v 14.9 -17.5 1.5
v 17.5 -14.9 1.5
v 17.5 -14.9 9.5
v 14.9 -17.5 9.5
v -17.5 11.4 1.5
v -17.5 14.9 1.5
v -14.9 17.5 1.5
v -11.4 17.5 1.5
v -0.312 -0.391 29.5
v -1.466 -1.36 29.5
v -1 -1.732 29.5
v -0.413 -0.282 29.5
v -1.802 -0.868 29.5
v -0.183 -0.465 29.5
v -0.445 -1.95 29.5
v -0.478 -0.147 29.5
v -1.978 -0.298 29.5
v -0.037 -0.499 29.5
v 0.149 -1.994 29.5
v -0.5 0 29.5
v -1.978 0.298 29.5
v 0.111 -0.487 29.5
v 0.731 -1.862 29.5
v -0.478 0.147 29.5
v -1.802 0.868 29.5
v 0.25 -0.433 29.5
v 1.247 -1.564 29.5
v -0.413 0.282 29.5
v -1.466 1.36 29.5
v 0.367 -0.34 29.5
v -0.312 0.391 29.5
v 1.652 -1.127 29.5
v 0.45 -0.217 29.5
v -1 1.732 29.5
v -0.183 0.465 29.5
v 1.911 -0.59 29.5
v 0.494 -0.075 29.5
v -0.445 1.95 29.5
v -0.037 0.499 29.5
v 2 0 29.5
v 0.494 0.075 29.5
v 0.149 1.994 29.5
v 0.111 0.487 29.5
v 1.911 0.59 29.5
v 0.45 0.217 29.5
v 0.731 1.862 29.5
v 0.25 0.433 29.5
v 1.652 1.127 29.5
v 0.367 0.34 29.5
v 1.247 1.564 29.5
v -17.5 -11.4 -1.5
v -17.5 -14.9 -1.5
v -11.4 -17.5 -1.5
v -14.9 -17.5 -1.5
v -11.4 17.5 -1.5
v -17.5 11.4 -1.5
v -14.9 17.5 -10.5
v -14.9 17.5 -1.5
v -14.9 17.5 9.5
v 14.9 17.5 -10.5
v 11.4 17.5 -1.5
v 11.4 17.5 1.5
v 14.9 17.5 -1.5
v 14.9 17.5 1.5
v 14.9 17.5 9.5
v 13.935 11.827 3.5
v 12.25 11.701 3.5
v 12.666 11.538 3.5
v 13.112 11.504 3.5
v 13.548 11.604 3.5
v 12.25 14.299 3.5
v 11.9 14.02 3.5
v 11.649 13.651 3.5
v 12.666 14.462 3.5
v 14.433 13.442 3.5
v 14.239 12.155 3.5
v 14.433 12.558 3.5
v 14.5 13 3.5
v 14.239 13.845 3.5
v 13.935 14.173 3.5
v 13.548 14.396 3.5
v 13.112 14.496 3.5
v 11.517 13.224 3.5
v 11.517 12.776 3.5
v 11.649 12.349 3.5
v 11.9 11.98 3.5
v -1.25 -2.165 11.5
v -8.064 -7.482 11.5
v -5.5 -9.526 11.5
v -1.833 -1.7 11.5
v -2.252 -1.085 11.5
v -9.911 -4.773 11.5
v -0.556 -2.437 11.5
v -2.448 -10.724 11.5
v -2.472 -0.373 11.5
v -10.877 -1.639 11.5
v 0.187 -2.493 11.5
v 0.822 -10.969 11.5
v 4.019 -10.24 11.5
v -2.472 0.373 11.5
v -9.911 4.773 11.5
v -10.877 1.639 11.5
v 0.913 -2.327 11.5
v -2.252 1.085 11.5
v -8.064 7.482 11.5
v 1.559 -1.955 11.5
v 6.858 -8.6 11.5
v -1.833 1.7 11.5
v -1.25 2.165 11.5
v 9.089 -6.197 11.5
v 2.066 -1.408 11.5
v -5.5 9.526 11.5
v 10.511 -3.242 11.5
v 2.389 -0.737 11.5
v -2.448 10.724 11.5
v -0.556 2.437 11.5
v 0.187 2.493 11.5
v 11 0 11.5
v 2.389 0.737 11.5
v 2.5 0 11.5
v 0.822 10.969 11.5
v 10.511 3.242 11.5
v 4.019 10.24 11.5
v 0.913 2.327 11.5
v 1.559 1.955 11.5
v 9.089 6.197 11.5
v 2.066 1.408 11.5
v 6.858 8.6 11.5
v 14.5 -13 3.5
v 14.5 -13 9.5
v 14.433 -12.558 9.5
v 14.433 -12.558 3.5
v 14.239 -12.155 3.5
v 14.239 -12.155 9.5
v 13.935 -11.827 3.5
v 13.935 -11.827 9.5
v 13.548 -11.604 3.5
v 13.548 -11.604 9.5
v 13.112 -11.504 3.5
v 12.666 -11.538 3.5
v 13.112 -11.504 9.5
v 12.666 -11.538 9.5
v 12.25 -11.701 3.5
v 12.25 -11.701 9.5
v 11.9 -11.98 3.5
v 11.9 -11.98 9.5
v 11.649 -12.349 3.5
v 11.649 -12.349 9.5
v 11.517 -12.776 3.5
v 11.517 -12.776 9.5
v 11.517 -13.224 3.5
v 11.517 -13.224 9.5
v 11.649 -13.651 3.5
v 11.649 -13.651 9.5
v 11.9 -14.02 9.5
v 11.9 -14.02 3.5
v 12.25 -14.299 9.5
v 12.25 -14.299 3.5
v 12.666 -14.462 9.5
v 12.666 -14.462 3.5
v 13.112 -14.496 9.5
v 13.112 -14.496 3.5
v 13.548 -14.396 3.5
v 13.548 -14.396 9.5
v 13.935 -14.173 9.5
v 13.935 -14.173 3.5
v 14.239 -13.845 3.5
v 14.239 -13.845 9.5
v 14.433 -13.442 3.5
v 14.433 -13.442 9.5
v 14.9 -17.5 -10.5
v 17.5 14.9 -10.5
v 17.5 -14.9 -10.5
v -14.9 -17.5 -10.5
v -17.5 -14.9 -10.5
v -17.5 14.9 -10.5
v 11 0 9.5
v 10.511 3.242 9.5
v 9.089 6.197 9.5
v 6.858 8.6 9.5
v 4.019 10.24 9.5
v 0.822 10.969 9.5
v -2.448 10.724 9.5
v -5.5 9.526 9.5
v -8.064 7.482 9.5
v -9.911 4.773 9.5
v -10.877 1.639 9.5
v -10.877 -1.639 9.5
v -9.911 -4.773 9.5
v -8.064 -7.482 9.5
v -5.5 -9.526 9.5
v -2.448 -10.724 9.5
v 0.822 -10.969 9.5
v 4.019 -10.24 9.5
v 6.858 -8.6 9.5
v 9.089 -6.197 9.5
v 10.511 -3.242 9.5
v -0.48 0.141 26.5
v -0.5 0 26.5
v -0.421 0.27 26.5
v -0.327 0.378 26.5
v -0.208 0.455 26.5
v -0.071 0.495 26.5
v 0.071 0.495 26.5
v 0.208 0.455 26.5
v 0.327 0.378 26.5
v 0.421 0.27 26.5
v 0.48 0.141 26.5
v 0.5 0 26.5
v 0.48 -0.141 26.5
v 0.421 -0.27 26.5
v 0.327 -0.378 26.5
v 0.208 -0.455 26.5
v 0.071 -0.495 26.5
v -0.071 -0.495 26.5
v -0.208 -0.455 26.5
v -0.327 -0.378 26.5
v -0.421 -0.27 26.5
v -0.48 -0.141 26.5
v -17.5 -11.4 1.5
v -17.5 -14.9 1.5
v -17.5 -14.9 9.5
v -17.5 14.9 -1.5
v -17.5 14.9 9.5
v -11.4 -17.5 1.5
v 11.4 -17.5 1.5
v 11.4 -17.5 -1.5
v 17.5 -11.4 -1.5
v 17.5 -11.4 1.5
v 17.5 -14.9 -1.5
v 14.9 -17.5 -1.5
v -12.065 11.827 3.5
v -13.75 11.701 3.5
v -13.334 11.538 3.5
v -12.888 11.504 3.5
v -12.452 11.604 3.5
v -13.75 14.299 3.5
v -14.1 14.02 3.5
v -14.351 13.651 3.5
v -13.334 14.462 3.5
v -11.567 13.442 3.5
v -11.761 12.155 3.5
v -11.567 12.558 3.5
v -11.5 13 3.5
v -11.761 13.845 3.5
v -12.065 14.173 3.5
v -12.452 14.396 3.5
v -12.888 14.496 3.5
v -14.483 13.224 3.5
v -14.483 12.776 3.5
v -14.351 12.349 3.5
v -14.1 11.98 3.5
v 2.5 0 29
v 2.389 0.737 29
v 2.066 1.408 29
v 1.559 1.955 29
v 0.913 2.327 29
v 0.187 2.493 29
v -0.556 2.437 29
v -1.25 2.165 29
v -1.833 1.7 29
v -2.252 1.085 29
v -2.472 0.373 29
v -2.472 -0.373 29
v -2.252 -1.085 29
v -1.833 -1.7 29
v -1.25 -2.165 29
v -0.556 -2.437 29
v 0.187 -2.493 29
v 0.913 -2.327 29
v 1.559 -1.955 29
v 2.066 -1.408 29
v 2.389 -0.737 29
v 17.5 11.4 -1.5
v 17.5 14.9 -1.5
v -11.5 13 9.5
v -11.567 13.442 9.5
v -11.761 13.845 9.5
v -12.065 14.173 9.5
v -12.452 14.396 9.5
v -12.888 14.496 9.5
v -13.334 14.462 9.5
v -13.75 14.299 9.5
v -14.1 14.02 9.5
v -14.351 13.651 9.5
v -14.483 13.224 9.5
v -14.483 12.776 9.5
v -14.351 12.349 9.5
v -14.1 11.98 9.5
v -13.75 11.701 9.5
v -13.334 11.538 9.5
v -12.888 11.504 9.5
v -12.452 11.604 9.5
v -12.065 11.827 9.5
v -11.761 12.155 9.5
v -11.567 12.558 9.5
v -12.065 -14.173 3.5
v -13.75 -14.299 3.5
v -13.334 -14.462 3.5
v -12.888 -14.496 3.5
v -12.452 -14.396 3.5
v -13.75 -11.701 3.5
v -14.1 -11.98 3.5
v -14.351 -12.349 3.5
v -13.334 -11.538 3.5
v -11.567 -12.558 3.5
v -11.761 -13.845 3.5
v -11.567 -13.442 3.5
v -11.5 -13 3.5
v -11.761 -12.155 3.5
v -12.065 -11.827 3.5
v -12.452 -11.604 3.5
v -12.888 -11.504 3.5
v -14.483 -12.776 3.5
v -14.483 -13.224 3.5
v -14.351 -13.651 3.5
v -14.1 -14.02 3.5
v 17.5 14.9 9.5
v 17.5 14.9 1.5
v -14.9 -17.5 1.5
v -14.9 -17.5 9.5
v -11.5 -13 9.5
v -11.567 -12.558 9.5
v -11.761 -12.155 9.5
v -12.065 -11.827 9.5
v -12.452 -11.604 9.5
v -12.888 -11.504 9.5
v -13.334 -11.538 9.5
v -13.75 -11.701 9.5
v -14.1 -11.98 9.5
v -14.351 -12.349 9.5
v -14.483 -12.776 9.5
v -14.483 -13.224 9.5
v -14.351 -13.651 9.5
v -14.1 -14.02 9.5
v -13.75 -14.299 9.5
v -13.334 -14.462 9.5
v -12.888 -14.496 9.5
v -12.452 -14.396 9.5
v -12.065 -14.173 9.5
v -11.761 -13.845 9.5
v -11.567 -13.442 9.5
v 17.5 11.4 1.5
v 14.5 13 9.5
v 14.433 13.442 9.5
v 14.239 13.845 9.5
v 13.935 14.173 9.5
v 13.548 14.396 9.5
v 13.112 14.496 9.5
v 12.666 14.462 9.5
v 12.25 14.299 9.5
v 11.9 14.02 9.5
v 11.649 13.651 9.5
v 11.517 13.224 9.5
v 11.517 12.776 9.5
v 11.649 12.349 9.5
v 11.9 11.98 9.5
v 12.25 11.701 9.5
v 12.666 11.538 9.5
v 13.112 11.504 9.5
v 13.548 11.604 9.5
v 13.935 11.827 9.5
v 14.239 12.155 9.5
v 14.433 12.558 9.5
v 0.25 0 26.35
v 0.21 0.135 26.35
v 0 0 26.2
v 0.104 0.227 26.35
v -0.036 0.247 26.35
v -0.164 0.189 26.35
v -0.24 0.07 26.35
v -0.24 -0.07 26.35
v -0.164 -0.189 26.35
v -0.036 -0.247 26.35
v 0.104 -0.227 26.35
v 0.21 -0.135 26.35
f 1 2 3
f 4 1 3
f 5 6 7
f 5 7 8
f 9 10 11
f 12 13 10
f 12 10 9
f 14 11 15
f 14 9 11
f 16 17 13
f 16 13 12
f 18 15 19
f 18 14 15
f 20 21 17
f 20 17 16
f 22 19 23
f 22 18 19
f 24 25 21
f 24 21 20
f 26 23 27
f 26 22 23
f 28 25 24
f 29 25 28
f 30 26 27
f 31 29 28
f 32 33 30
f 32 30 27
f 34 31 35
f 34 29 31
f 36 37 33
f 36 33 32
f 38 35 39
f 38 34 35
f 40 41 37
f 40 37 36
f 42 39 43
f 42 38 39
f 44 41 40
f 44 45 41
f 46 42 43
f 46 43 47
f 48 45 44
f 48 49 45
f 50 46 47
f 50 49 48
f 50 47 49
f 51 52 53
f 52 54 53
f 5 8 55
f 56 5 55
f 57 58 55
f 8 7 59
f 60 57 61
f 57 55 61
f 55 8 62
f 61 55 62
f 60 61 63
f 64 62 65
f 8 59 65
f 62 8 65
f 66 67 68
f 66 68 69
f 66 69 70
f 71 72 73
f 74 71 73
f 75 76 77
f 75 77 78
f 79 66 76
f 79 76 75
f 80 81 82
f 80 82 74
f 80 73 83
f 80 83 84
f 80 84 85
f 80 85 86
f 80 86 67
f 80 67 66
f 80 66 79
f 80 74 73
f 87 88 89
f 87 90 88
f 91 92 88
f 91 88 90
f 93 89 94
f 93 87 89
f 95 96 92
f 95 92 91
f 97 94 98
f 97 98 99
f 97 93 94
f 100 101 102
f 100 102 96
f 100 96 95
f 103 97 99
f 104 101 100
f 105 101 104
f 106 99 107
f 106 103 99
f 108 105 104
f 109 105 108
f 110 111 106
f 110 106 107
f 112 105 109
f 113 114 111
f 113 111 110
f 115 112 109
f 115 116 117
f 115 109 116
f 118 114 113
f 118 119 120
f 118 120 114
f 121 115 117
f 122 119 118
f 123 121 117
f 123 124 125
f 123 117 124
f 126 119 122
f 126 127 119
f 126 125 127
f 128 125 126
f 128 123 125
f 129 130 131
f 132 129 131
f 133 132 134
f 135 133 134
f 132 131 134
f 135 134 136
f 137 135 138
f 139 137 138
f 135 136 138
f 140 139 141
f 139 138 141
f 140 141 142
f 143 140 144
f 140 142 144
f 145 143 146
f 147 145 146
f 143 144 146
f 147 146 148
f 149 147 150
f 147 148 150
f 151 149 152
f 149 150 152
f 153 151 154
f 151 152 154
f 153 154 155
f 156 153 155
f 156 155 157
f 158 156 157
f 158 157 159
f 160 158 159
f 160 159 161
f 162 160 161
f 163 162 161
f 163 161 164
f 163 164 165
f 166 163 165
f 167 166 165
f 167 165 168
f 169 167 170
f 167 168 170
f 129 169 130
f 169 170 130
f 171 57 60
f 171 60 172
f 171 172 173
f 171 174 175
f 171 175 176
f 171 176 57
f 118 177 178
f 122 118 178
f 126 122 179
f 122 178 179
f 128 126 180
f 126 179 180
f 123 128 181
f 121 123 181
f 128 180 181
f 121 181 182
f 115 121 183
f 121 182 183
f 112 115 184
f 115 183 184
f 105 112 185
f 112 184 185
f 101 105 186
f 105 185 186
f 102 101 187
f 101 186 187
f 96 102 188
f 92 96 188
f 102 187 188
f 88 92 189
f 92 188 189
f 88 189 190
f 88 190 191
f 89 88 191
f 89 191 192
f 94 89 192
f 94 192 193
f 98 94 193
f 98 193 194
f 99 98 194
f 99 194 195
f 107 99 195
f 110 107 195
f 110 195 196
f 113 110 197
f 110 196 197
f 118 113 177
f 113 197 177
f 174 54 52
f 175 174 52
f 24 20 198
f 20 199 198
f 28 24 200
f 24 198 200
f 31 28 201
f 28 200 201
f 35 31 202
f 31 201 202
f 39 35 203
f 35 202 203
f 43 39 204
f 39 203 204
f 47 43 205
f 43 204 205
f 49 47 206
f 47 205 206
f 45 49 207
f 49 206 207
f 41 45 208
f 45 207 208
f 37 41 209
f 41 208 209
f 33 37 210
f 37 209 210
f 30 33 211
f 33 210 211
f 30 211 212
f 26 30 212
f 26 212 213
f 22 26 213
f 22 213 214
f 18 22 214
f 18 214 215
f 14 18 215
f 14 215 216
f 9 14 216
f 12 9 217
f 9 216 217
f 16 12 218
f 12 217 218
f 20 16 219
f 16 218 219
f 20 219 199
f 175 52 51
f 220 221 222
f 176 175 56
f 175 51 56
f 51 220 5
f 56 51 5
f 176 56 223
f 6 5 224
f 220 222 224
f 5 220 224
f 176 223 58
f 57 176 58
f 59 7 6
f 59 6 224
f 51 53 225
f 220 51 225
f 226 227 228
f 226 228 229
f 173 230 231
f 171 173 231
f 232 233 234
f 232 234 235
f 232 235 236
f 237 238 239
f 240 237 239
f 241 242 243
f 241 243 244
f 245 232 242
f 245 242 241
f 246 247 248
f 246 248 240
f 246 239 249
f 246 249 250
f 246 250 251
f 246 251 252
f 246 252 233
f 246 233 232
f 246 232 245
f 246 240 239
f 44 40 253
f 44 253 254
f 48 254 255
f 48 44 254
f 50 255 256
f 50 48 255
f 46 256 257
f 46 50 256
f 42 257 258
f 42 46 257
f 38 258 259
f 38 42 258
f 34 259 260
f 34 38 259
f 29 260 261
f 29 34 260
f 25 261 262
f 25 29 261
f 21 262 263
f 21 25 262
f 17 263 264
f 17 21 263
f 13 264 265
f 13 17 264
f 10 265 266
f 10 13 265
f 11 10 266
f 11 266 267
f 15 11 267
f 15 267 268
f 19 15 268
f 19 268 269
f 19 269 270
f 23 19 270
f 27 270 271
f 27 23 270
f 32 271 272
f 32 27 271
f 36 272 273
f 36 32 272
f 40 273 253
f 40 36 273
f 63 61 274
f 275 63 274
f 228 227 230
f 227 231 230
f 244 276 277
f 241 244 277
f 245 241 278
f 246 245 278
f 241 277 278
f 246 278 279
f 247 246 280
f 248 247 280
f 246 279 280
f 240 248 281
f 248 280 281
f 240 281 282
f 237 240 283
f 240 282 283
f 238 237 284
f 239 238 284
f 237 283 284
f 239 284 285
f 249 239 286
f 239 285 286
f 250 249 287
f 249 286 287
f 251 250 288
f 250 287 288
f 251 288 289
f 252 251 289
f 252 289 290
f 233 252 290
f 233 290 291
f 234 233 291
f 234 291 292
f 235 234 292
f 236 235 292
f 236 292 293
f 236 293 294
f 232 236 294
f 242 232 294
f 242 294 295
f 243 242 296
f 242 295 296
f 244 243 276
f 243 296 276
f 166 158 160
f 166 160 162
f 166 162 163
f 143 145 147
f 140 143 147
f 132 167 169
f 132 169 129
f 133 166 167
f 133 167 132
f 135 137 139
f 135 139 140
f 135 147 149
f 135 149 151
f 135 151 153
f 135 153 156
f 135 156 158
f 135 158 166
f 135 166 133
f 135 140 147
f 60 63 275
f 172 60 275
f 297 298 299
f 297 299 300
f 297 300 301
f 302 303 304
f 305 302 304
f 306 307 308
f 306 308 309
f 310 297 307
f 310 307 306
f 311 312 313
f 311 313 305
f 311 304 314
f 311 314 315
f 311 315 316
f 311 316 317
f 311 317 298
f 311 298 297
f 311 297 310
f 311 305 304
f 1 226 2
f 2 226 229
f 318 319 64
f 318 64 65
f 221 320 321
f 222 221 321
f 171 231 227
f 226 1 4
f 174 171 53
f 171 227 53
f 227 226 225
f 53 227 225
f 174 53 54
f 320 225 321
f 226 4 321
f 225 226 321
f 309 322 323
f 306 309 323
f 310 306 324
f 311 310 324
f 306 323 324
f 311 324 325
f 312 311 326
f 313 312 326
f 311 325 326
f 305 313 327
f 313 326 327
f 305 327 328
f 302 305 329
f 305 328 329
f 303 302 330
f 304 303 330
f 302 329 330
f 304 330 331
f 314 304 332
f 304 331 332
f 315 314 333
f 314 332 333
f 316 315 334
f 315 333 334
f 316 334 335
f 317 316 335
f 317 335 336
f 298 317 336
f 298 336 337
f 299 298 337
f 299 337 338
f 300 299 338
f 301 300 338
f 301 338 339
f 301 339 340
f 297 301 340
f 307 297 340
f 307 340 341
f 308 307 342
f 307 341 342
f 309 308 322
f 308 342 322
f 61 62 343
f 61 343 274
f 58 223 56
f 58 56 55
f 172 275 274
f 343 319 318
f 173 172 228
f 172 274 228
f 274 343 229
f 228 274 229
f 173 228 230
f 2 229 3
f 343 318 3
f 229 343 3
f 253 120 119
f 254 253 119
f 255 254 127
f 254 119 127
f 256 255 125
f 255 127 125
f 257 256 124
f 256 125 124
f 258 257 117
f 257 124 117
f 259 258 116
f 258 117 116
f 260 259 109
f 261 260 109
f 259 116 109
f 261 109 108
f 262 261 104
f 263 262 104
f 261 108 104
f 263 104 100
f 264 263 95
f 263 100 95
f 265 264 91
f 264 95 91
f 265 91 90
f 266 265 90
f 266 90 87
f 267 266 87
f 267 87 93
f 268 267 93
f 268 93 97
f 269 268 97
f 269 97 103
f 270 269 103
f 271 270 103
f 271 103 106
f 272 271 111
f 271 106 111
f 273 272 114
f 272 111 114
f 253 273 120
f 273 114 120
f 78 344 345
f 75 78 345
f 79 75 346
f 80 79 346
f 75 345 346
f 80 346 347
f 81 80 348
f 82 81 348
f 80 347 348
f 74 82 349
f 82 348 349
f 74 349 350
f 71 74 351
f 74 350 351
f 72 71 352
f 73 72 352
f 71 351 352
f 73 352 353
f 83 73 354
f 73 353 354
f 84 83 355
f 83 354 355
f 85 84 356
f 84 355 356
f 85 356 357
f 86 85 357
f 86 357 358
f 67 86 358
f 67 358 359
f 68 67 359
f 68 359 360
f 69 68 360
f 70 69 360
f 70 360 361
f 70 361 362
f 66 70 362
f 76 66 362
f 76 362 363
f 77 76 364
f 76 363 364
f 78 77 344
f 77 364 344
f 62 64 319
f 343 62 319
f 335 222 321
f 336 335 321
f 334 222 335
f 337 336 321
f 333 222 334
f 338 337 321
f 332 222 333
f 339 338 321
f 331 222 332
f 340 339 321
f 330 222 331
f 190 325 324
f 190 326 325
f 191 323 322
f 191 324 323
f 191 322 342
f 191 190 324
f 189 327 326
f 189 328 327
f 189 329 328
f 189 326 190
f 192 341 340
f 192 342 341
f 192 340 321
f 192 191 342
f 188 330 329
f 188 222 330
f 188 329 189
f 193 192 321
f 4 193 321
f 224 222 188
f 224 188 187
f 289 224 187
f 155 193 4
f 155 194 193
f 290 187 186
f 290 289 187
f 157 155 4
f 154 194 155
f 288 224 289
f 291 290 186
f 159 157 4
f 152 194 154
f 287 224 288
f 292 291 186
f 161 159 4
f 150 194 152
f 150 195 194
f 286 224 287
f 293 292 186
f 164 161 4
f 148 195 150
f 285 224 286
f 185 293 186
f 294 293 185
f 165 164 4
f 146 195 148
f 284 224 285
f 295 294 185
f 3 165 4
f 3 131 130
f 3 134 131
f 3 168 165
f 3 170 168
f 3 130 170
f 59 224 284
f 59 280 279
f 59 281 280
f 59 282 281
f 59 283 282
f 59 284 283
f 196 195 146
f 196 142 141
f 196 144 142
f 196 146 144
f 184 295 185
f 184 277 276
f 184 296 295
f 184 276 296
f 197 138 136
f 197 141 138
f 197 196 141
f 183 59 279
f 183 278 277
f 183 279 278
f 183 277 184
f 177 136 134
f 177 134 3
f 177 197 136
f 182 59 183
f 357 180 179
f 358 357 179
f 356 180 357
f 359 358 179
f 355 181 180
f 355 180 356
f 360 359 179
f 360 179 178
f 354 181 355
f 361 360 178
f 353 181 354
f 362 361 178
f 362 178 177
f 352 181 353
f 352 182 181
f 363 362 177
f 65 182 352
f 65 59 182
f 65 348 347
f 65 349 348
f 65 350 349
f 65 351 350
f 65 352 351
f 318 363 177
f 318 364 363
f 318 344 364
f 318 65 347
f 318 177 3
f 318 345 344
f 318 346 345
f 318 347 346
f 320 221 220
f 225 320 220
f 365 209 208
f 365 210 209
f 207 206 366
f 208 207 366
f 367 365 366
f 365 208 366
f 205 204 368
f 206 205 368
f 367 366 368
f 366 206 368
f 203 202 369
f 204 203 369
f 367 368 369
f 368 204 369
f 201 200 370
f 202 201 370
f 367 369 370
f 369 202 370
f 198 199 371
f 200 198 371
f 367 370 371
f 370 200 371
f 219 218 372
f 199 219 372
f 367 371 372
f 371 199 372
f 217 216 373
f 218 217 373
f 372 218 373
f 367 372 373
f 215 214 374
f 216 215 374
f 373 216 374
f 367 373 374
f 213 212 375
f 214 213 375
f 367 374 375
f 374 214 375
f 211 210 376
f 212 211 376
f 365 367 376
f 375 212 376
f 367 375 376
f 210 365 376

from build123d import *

# Parameters (mm, degrees)
F0_W      = 35
F0_H      = 35
F1_DEPTH  = 1.5
F2_SIZE   = 6.1
F3_W      = 35
F3_H      = 35
F4_DEPTH  = 8
F5_SIZE   = 2.6
F7_DEPTH  = 9
F8_R      = 11
F9_DEPTH  = 2
F10_R     = 2.5
F11_DEPTH = 18
F12_R     = 1.5
F13_DEPTH = 6
F14_SIZE  = 0.5
F16_D     = 1
F16_DEPTH = 3
F16_TIP   = 0.3004303095


with BuildPart() as f1:
    # F0 (on Top) → F1 (new body, symmetric)
    with BuildSketch(Plane.XY):
        Rectangle(F0_W, F0_H)
    extrude(amount=F1_DEPTH, both=True)

    # F2
    f2_edges = [f1.edges().sort_by_distance(p)[0] for p in [
        (-17.5, -17.5, 0),
        (17.5, -17.5, 0),
        (17.5, 17.5, 0),
        (-17.5, 17.5, 0),
    ]]
    chamfer(f2_edges, length=F2_SIZE)

    # F3 (on face) → F4 (join)
    with BuildSketch(Plane.XY.offset(1.5)):
        Rectangle(F3_W, F3_H)
    extrude(amount=F4_DEPTH)

    # F5
    f5_edges = [f1.edges().sort_by_distance(p)[0] for p in [
        (-17.5, -17.5, 5.5),
        (17.5, -17.5, 5.5),
        (17.5, 17.5, 5.5),
        (-17.5, 17.5, 5.5),
    ]]
    chamfer(f5_edges, length=F5_SIZE)

    # F6 (on face) → F7 (join)
    with BuildSketch(Plane(origin=(0, 0, -1.5), x_dir=(1, 0, 0), z_dir=(0, 0, -1))):
        Polygon((-14.9, -17.5), (14.9, -17.5), (17.5, -14.9), (17.5, 14.9), (14.9, 17.5), (-14.9, 17.5), (-17.5, 14.9), (-17.5, -14.9), align=None)
    extrude(amount=F7_DEPTH)

    # F8 (on face) → F9 (join)
    with BuildSketch(Plane.XY.offset(9.5)):
        Circle(F8_R)
    extrude(amount=F9_DEPTH)

    # F10 (on face) → F11 (join)
    with BuildSketch(Plane.XY.offset(11.5)):
        Circle(F10_R)
    extrude(amount=F11_DEPTH)

    # F12 (on face) → F13 (cut)
    with BuildSketch(Plane.XY.offset(9.5)):
        with Locations((-13, 13)):
            Circle(F12_R)
        with Locations((13, 13)):
            Circle(F12_R)
        with Locations((-13, -13)):
            Circle(F12_R)
        with Locations((13, -13)):
            Circle(F12_R)
    extrude(amount=-F13_DEPTH, mode=Mode.SUBTRACT)

    # F14
    f14_edges = [f1.edges().sort_by_distance(p)[0] for p in [
        (-2.5, 0, 29.5),
    ]]
    chamfer(f14_edges, length=F14_SIZE)

    # F16
    with Locations(Plane.XY.offset(29.5)):
        with Locations((0, 0)):
            Hole(F16_D / 2, depth=F16_DEPTH)
            with Locations((0, 0, -(F16_DEPTH + F16_TIP / 2))):  # 118° drill point
                Cone(0, F16_D / 2, F16_TIP, mode=Mode.SUBTRACT)


solid = f1.part
